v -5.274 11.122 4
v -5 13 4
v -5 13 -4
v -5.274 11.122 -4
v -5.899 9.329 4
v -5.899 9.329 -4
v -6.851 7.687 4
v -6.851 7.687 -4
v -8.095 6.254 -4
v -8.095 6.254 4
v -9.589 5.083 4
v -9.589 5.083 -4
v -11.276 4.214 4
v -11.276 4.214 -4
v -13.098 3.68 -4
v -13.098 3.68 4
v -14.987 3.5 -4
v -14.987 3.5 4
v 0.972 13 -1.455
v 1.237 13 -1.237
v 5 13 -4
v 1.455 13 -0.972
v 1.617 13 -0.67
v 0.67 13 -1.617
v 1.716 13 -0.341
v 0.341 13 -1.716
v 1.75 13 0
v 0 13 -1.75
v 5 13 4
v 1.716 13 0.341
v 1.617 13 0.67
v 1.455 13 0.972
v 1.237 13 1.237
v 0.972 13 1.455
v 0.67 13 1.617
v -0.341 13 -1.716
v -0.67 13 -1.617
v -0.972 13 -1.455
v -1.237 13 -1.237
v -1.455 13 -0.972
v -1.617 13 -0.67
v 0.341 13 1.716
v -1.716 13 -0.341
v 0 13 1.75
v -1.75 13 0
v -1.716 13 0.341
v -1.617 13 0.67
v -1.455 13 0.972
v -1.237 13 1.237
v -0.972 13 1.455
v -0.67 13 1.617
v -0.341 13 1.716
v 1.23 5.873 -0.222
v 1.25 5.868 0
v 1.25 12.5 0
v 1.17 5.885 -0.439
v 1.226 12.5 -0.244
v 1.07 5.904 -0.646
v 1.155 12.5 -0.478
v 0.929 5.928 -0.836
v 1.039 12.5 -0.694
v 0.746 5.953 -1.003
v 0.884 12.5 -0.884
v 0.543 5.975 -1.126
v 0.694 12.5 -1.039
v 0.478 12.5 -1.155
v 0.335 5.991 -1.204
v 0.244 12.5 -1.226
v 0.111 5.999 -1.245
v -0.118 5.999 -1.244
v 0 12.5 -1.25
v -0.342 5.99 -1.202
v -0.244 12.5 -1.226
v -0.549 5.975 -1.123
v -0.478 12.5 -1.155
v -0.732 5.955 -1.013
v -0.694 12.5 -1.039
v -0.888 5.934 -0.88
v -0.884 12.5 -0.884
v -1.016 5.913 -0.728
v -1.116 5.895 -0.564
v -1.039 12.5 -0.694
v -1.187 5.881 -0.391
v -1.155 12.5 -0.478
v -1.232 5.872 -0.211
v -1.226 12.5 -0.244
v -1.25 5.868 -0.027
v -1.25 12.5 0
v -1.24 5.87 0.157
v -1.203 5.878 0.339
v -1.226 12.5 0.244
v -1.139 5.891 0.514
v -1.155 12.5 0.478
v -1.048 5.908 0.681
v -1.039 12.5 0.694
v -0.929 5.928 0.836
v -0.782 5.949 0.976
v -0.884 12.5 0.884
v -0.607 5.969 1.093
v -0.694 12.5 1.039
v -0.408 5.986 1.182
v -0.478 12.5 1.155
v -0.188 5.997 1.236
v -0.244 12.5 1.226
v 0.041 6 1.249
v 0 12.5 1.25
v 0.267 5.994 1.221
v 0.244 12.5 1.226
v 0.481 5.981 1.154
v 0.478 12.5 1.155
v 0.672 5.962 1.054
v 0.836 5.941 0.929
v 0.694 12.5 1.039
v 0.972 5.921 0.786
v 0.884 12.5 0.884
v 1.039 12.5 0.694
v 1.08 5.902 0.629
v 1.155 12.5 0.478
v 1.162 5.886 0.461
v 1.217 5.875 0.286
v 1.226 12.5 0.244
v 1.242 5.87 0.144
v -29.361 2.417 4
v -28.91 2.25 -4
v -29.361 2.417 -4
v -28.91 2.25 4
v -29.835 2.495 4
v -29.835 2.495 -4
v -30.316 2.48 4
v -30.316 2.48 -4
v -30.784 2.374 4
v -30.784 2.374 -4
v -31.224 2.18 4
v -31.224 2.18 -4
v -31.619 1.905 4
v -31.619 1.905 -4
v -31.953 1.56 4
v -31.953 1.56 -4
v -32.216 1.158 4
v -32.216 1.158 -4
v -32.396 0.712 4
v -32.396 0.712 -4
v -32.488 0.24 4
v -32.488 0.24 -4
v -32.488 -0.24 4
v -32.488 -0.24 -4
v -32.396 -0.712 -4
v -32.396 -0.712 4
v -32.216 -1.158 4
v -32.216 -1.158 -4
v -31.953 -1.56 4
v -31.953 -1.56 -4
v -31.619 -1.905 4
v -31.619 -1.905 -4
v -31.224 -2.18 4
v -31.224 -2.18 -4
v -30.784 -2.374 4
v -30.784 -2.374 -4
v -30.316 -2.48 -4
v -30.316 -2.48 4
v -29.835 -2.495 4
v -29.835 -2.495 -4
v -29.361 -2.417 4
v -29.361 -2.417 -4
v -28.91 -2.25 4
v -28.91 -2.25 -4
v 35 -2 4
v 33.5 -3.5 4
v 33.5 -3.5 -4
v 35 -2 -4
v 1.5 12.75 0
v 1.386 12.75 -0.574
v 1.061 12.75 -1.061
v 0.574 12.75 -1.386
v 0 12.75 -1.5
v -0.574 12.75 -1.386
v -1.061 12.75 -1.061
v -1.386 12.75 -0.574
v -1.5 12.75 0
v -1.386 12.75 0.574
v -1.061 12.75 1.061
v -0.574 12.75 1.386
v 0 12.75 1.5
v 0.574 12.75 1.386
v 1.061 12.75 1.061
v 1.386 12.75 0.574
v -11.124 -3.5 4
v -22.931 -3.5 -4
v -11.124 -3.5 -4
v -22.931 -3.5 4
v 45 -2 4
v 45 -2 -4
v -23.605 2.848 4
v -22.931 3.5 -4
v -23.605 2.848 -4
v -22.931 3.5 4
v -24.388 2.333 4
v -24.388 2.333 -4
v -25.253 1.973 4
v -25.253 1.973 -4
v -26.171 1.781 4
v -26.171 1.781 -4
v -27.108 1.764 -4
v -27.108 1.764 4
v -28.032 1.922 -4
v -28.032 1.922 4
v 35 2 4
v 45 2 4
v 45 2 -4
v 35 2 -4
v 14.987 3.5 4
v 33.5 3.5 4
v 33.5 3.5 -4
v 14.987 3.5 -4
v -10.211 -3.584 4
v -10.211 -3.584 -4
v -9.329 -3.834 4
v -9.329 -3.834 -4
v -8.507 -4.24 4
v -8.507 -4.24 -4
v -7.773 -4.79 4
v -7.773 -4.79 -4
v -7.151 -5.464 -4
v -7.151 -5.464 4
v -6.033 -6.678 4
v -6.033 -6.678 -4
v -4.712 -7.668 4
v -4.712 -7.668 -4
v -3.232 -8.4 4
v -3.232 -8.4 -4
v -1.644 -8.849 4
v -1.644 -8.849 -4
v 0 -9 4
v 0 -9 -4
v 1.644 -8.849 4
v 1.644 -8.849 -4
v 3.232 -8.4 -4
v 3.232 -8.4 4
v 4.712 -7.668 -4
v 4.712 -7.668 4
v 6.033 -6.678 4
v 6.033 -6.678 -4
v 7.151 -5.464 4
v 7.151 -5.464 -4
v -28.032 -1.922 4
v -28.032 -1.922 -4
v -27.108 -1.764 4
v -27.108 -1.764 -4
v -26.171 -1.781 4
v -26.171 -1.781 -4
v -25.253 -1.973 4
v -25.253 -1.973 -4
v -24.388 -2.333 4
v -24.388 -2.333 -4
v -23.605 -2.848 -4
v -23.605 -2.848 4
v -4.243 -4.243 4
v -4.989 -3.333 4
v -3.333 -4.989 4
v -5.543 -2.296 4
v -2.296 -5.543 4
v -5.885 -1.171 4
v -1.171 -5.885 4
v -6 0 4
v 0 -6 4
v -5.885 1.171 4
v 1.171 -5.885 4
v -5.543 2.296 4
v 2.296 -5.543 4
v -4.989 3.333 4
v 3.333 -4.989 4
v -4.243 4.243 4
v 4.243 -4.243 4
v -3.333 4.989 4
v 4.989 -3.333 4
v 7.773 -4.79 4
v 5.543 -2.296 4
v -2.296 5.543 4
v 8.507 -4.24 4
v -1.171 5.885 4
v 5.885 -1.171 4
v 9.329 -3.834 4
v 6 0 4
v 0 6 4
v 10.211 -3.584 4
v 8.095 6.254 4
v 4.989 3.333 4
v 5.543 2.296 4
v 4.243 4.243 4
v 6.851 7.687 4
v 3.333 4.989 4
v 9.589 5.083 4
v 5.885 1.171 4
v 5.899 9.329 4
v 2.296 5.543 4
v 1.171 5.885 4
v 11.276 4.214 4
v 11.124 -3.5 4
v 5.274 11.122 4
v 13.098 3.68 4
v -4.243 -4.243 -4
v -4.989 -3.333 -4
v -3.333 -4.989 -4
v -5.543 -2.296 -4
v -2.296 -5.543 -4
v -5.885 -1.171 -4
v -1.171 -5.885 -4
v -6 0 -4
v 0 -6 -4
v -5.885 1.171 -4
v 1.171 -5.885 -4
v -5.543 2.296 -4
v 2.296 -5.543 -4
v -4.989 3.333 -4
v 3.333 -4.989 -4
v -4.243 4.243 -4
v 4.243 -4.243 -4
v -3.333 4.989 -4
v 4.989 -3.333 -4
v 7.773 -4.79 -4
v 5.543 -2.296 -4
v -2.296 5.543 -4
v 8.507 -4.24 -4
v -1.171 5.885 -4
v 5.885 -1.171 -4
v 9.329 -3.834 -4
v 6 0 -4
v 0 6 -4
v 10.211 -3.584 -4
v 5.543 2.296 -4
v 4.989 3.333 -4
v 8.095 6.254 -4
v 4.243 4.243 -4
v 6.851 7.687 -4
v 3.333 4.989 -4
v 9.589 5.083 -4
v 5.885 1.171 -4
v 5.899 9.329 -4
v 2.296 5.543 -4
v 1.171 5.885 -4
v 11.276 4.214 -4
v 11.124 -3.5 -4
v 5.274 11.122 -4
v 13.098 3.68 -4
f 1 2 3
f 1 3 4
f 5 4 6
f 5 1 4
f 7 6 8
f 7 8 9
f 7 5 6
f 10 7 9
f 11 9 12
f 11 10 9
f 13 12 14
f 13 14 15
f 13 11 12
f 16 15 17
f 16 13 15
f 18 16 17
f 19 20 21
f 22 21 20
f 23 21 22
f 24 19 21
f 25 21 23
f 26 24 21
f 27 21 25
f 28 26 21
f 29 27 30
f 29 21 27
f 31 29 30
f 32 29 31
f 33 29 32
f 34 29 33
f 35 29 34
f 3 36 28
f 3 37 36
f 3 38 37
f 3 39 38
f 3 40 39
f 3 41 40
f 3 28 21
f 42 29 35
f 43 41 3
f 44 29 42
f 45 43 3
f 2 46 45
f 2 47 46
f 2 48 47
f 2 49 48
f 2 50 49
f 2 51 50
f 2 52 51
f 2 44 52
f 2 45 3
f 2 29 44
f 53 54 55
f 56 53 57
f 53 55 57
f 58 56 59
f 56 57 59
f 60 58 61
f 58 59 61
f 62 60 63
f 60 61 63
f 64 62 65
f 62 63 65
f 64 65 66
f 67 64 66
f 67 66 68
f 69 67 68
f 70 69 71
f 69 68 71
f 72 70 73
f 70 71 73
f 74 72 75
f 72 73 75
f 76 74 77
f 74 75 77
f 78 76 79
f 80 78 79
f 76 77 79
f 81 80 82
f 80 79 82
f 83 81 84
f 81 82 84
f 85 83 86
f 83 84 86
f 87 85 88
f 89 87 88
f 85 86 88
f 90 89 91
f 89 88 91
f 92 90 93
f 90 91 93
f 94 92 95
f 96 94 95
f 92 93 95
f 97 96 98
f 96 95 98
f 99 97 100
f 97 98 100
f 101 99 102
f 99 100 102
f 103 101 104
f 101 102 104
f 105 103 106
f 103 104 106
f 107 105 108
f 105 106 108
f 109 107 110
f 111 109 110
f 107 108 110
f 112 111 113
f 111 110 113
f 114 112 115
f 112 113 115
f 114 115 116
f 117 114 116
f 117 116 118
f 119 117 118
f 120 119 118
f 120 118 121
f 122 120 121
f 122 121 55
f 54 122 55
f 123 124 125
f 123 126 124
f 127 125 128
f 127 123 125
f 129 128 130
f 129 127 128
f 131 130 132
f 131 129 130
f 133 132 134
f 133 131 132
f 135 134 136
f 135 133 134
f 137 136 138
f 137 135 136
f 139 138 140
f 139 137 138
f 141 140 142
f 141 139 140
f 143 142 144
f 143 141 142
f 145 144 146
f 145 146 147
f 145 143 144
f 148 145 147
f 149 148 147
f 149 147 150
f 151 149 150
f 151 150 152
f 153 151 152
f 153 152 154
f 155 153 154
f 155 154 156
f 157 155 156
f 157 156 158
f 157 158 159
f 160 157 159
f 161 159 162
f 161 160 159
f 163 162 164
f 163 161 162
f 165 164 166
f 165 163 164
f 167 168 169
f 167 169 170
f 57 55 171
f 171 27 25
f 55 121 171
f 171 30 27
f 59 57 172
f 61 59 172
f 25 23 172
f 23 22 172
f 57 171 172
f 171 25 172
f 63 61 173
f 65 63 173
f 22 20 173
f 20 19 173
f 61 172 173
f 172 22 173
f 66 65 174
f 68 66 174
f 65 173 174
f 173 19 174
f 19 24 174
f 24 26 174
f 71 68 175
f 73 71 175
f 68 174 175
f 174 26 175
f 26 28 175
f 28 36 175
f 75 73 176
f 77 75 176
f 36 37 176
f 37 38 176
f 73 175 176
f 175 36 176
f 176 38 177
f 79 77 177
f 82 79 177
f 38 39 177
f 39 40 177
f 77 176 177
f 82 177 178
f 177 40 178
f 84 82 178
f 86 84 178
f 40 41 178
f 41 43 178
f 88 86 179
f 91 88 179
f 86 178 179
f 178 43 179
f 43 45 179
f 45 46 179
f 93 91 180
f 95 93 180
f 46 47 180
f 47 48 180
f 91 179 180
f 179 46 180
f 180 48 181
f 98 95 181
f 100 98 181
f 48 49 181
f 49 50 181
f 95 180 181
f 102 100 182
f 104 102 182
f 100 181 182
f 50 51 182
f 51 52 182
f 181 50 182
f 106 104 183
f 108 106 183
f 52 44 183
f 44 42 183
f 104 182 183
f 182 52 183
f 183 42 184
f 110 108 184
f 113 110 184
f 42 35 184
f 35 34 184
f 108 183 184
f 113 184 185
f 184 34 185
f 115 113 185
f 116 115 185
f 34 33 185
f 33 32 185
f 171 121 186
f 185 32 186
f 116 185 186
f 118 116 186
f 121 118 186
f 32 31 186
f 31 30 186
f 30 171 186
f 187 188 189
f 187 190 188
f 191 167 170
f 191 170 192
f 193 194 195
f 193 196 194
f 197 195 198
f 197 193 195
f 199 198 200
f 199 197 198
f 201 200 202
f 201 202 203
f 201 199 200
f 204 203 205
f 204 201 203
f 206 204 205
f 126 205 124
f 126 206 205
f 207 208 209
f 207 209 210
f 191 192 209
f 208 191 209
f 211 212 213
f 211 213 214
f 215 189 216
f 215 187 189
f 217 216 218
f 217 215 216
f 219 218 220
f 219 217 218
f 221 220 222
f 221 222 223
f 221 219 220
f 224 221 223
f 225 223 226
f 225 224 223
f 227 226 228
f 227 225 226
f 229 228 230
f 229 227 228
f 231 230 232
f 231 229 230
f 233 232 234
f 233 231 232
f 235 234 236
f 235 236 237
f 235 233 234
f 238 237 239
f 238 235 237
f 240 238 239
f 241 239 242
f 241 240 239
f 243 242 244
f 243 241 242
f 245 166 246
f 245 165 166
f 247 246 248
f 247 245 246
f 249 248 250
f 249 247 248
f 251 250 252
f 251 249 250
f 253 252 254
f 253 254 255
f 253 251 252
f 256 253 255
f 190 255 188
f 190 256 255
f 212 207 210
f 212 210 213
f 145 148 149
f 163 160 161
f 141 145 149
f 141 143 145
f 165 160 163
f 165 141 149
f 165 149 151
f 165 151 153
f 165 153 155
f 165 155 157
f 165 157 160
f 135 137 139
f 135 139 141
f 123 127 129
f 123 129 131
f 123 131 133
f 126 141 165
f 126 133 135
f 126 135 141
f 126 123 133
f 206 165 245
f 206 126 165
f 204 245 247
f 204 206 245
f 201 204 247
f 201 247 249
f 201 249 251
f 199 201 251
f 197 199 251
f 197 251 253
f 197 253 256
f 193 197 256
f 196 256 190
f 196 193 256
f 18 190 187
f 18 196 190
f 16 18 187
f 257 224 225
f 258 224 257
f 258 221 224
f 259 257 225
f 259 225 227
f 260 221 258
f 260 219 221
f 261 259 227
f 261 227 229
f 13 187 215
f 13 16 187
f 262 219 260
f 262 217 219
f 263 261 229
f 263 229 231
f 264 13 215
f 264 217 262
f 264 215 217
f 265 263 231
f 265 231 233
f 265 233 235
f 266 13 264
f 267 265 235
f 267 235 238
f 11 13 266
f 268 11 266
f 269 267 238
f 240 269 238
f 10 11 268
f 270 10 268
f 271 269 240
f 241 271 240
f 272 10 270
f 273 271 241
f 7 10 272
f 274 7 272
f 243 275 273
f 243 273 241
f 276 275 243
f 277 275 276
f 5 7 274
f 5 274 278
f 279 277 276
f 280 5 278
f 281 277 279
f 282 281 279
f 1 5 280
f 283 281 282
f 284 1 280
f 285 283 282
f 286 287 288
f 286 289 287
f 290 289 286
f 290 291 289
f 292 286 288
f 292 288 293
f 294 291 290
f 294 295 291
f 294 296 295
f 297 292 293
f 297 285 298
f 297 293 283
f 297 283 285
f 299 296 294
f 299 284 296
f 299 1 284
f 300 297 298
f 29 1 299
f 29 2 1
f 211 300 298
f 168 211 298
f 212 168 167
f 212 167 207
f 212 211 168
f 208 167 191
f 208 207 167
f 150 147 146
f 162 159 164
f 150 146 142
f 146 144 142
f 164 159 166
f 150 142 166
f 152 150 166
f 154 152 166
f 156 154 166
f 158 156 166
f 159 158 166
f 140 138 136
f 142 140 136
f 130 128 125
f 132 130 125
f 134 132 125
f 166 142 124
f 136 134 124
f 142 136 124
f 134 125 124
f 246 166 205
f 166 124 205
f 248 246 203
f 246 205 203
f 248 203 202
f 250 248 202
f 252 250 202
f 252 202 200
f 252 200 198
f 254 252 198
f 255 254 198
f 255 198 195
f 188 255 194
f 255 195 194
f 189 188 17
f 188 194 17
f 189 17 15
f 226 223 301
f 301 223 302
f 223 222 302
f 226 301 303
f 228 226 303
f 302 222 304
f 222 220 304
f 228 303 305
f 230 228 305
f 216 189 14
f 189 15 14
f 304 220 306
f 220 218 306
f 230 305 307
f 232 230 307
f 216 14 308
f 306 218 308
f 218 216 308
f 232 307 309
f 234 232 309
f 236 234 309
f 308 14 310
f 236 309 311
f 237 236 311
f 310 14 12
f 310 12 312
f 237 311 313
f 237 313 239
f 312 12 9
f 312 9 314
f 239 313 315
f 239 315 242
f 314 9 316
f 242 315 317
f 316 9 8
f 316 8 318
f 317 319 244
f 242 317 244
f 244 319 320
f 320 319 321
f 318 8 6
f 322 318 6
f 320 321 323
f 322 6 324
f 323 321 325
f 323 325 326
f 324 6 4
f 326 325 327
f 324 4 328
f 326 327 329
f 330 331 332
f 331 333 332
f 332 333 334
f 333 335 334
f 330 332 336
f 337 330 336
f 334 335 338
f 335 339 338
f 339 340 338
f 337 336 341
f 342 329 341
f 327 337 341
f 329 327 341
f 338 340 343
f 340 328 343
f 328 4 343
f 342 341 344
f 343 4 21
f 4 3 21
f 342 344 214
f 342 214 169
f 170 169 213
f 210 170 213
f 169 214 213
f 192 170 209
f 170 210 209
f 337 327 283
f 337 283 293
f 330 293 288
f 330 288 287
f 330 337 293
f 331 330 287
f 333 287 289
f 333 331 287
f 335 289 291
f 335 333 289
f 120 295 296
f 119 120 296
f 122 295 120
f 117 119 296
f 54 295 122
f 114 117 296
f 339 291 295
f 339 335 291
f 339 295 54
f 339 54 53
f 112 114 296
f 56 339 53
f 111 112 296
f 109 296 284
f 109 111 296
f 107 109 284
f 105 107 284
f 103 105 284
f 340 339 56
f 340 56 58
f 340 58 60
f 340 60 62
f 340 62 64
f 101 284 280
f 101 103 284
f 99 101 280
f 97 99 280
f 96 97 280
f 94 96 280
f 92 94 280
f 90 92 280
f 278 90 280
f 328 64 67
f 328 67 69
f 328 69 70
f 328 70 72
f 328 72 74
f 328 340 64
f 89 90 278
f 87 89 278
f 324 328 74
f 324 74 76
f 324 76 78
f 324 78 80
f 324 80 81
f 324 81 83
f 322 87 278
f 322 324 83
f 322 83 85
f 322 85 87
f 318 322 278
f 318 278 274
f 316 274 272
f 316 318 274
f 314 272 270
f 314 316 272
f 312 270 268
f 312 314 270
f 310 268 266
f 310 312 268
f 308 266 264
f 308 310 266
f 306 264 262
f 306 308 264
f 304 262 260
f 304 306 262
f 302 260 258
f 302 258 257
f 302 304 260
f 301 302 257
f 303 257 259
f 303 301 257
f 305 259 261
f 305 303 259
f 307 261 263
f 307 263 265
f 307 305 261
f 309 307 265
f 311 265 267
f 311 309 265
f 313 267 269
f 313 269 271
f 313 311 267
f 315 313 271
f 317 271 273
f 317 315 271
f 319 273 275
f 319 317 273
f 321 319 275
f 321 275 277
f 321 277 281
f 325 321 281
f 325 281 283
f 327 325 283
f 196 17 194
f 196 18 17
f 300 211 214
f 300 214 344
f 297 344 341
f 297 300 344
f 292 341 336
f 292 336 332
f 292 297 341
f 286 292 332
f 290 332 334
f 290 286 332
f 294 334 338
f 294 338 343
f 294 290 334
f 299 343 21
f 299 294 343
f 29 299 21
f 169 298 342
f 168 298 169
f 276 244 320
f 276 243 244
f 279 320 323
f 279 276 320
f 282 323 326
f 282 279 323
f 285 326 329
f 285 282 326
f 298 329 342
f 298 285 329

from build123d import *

# Parameters (mm, degrees)
SKETCH_1_R      = 6
EXTRUDE_1_DEPTH = 4


# Read off the part's stored shape, not the designer's step: Отверстие обработанное метчиком M31
with BuildPart() as part:
    # Эскиз1 → Бобышка-Вытянуть1 (new, symmetric)
    with BuildSketch(Plane.XY):
        with BuildLine():
            Line((11.124297731, -3.5), (33.5, -3.5))
            Line((33.5, -3.5), (35, -2))
            Line((35, -2), (45, -2))
            Line((45, -2), (45, 2))
            Line((45, 2), (35, 2))
            Line((35, 2), (33.5, 3.5))
            Line((33.5, 3.5), (14.987492178, 3.5))
            ThreePointArc((14.987492178, 3.5), (8.095467802, 6.254311627), (5, 13))
            Line((5, 13), (-5, 13))
            ThreePointArc((-5, 13), (-8.095467802, 6.254311627), (-14.987492178, 3.5))
            Line((-14.987492178, 3.5), (-22.931154754, 3.5))
            ThreePointArc((-22.931154754, 3.5), (-25.707642289, 1.855810024), (-28.910275264, 2.25))
            ThreePointArc((-28.910275264, 2.25), (-32.5, 0), (-28.910275264, -2.25))
            ThreePointArc((-28.910275264, -2.25), (-25.707642289, -1.855810024), (-22.931154754, -3.5))
            Line((-22.931154754, -3.5), (-11.124297731, -3.5))
            ThreePointArc((-11.124297731, -3.5), (-8.90828458, -4.017892715), (-7.151334255, -5.464285714))
            ThreePointArc((-7.151334255, -5.464285714), (0, -9), (7.151334255, -5.464285714))
            ThreePointArc((7.151334255, -5.464285714), (8.90828458, -4.017892715), (11.124297731, -3.5))
        make_face()
        Circle(SKETCH_1_R, mode=Mode.SUBTRACT)
    extrude(amount=EXTRUDE_1_DEPTH, both=True)

    # Отверстие обработанное метчиком M31 outline → Отверстие обработанное метчиком M31 (revolve, cut)
    with BuildSketch(Plane.XY):
        Polygon((0, 5.868327481), (1.25, 5.868327481), (1.25, 12.5), (1.75, 13), (0, 13), align=None)
    revolve(axis=Axis((0, 0, 0), (0, 1, 0)), mode=Mode.SUBTRACT)


solid = part.part
